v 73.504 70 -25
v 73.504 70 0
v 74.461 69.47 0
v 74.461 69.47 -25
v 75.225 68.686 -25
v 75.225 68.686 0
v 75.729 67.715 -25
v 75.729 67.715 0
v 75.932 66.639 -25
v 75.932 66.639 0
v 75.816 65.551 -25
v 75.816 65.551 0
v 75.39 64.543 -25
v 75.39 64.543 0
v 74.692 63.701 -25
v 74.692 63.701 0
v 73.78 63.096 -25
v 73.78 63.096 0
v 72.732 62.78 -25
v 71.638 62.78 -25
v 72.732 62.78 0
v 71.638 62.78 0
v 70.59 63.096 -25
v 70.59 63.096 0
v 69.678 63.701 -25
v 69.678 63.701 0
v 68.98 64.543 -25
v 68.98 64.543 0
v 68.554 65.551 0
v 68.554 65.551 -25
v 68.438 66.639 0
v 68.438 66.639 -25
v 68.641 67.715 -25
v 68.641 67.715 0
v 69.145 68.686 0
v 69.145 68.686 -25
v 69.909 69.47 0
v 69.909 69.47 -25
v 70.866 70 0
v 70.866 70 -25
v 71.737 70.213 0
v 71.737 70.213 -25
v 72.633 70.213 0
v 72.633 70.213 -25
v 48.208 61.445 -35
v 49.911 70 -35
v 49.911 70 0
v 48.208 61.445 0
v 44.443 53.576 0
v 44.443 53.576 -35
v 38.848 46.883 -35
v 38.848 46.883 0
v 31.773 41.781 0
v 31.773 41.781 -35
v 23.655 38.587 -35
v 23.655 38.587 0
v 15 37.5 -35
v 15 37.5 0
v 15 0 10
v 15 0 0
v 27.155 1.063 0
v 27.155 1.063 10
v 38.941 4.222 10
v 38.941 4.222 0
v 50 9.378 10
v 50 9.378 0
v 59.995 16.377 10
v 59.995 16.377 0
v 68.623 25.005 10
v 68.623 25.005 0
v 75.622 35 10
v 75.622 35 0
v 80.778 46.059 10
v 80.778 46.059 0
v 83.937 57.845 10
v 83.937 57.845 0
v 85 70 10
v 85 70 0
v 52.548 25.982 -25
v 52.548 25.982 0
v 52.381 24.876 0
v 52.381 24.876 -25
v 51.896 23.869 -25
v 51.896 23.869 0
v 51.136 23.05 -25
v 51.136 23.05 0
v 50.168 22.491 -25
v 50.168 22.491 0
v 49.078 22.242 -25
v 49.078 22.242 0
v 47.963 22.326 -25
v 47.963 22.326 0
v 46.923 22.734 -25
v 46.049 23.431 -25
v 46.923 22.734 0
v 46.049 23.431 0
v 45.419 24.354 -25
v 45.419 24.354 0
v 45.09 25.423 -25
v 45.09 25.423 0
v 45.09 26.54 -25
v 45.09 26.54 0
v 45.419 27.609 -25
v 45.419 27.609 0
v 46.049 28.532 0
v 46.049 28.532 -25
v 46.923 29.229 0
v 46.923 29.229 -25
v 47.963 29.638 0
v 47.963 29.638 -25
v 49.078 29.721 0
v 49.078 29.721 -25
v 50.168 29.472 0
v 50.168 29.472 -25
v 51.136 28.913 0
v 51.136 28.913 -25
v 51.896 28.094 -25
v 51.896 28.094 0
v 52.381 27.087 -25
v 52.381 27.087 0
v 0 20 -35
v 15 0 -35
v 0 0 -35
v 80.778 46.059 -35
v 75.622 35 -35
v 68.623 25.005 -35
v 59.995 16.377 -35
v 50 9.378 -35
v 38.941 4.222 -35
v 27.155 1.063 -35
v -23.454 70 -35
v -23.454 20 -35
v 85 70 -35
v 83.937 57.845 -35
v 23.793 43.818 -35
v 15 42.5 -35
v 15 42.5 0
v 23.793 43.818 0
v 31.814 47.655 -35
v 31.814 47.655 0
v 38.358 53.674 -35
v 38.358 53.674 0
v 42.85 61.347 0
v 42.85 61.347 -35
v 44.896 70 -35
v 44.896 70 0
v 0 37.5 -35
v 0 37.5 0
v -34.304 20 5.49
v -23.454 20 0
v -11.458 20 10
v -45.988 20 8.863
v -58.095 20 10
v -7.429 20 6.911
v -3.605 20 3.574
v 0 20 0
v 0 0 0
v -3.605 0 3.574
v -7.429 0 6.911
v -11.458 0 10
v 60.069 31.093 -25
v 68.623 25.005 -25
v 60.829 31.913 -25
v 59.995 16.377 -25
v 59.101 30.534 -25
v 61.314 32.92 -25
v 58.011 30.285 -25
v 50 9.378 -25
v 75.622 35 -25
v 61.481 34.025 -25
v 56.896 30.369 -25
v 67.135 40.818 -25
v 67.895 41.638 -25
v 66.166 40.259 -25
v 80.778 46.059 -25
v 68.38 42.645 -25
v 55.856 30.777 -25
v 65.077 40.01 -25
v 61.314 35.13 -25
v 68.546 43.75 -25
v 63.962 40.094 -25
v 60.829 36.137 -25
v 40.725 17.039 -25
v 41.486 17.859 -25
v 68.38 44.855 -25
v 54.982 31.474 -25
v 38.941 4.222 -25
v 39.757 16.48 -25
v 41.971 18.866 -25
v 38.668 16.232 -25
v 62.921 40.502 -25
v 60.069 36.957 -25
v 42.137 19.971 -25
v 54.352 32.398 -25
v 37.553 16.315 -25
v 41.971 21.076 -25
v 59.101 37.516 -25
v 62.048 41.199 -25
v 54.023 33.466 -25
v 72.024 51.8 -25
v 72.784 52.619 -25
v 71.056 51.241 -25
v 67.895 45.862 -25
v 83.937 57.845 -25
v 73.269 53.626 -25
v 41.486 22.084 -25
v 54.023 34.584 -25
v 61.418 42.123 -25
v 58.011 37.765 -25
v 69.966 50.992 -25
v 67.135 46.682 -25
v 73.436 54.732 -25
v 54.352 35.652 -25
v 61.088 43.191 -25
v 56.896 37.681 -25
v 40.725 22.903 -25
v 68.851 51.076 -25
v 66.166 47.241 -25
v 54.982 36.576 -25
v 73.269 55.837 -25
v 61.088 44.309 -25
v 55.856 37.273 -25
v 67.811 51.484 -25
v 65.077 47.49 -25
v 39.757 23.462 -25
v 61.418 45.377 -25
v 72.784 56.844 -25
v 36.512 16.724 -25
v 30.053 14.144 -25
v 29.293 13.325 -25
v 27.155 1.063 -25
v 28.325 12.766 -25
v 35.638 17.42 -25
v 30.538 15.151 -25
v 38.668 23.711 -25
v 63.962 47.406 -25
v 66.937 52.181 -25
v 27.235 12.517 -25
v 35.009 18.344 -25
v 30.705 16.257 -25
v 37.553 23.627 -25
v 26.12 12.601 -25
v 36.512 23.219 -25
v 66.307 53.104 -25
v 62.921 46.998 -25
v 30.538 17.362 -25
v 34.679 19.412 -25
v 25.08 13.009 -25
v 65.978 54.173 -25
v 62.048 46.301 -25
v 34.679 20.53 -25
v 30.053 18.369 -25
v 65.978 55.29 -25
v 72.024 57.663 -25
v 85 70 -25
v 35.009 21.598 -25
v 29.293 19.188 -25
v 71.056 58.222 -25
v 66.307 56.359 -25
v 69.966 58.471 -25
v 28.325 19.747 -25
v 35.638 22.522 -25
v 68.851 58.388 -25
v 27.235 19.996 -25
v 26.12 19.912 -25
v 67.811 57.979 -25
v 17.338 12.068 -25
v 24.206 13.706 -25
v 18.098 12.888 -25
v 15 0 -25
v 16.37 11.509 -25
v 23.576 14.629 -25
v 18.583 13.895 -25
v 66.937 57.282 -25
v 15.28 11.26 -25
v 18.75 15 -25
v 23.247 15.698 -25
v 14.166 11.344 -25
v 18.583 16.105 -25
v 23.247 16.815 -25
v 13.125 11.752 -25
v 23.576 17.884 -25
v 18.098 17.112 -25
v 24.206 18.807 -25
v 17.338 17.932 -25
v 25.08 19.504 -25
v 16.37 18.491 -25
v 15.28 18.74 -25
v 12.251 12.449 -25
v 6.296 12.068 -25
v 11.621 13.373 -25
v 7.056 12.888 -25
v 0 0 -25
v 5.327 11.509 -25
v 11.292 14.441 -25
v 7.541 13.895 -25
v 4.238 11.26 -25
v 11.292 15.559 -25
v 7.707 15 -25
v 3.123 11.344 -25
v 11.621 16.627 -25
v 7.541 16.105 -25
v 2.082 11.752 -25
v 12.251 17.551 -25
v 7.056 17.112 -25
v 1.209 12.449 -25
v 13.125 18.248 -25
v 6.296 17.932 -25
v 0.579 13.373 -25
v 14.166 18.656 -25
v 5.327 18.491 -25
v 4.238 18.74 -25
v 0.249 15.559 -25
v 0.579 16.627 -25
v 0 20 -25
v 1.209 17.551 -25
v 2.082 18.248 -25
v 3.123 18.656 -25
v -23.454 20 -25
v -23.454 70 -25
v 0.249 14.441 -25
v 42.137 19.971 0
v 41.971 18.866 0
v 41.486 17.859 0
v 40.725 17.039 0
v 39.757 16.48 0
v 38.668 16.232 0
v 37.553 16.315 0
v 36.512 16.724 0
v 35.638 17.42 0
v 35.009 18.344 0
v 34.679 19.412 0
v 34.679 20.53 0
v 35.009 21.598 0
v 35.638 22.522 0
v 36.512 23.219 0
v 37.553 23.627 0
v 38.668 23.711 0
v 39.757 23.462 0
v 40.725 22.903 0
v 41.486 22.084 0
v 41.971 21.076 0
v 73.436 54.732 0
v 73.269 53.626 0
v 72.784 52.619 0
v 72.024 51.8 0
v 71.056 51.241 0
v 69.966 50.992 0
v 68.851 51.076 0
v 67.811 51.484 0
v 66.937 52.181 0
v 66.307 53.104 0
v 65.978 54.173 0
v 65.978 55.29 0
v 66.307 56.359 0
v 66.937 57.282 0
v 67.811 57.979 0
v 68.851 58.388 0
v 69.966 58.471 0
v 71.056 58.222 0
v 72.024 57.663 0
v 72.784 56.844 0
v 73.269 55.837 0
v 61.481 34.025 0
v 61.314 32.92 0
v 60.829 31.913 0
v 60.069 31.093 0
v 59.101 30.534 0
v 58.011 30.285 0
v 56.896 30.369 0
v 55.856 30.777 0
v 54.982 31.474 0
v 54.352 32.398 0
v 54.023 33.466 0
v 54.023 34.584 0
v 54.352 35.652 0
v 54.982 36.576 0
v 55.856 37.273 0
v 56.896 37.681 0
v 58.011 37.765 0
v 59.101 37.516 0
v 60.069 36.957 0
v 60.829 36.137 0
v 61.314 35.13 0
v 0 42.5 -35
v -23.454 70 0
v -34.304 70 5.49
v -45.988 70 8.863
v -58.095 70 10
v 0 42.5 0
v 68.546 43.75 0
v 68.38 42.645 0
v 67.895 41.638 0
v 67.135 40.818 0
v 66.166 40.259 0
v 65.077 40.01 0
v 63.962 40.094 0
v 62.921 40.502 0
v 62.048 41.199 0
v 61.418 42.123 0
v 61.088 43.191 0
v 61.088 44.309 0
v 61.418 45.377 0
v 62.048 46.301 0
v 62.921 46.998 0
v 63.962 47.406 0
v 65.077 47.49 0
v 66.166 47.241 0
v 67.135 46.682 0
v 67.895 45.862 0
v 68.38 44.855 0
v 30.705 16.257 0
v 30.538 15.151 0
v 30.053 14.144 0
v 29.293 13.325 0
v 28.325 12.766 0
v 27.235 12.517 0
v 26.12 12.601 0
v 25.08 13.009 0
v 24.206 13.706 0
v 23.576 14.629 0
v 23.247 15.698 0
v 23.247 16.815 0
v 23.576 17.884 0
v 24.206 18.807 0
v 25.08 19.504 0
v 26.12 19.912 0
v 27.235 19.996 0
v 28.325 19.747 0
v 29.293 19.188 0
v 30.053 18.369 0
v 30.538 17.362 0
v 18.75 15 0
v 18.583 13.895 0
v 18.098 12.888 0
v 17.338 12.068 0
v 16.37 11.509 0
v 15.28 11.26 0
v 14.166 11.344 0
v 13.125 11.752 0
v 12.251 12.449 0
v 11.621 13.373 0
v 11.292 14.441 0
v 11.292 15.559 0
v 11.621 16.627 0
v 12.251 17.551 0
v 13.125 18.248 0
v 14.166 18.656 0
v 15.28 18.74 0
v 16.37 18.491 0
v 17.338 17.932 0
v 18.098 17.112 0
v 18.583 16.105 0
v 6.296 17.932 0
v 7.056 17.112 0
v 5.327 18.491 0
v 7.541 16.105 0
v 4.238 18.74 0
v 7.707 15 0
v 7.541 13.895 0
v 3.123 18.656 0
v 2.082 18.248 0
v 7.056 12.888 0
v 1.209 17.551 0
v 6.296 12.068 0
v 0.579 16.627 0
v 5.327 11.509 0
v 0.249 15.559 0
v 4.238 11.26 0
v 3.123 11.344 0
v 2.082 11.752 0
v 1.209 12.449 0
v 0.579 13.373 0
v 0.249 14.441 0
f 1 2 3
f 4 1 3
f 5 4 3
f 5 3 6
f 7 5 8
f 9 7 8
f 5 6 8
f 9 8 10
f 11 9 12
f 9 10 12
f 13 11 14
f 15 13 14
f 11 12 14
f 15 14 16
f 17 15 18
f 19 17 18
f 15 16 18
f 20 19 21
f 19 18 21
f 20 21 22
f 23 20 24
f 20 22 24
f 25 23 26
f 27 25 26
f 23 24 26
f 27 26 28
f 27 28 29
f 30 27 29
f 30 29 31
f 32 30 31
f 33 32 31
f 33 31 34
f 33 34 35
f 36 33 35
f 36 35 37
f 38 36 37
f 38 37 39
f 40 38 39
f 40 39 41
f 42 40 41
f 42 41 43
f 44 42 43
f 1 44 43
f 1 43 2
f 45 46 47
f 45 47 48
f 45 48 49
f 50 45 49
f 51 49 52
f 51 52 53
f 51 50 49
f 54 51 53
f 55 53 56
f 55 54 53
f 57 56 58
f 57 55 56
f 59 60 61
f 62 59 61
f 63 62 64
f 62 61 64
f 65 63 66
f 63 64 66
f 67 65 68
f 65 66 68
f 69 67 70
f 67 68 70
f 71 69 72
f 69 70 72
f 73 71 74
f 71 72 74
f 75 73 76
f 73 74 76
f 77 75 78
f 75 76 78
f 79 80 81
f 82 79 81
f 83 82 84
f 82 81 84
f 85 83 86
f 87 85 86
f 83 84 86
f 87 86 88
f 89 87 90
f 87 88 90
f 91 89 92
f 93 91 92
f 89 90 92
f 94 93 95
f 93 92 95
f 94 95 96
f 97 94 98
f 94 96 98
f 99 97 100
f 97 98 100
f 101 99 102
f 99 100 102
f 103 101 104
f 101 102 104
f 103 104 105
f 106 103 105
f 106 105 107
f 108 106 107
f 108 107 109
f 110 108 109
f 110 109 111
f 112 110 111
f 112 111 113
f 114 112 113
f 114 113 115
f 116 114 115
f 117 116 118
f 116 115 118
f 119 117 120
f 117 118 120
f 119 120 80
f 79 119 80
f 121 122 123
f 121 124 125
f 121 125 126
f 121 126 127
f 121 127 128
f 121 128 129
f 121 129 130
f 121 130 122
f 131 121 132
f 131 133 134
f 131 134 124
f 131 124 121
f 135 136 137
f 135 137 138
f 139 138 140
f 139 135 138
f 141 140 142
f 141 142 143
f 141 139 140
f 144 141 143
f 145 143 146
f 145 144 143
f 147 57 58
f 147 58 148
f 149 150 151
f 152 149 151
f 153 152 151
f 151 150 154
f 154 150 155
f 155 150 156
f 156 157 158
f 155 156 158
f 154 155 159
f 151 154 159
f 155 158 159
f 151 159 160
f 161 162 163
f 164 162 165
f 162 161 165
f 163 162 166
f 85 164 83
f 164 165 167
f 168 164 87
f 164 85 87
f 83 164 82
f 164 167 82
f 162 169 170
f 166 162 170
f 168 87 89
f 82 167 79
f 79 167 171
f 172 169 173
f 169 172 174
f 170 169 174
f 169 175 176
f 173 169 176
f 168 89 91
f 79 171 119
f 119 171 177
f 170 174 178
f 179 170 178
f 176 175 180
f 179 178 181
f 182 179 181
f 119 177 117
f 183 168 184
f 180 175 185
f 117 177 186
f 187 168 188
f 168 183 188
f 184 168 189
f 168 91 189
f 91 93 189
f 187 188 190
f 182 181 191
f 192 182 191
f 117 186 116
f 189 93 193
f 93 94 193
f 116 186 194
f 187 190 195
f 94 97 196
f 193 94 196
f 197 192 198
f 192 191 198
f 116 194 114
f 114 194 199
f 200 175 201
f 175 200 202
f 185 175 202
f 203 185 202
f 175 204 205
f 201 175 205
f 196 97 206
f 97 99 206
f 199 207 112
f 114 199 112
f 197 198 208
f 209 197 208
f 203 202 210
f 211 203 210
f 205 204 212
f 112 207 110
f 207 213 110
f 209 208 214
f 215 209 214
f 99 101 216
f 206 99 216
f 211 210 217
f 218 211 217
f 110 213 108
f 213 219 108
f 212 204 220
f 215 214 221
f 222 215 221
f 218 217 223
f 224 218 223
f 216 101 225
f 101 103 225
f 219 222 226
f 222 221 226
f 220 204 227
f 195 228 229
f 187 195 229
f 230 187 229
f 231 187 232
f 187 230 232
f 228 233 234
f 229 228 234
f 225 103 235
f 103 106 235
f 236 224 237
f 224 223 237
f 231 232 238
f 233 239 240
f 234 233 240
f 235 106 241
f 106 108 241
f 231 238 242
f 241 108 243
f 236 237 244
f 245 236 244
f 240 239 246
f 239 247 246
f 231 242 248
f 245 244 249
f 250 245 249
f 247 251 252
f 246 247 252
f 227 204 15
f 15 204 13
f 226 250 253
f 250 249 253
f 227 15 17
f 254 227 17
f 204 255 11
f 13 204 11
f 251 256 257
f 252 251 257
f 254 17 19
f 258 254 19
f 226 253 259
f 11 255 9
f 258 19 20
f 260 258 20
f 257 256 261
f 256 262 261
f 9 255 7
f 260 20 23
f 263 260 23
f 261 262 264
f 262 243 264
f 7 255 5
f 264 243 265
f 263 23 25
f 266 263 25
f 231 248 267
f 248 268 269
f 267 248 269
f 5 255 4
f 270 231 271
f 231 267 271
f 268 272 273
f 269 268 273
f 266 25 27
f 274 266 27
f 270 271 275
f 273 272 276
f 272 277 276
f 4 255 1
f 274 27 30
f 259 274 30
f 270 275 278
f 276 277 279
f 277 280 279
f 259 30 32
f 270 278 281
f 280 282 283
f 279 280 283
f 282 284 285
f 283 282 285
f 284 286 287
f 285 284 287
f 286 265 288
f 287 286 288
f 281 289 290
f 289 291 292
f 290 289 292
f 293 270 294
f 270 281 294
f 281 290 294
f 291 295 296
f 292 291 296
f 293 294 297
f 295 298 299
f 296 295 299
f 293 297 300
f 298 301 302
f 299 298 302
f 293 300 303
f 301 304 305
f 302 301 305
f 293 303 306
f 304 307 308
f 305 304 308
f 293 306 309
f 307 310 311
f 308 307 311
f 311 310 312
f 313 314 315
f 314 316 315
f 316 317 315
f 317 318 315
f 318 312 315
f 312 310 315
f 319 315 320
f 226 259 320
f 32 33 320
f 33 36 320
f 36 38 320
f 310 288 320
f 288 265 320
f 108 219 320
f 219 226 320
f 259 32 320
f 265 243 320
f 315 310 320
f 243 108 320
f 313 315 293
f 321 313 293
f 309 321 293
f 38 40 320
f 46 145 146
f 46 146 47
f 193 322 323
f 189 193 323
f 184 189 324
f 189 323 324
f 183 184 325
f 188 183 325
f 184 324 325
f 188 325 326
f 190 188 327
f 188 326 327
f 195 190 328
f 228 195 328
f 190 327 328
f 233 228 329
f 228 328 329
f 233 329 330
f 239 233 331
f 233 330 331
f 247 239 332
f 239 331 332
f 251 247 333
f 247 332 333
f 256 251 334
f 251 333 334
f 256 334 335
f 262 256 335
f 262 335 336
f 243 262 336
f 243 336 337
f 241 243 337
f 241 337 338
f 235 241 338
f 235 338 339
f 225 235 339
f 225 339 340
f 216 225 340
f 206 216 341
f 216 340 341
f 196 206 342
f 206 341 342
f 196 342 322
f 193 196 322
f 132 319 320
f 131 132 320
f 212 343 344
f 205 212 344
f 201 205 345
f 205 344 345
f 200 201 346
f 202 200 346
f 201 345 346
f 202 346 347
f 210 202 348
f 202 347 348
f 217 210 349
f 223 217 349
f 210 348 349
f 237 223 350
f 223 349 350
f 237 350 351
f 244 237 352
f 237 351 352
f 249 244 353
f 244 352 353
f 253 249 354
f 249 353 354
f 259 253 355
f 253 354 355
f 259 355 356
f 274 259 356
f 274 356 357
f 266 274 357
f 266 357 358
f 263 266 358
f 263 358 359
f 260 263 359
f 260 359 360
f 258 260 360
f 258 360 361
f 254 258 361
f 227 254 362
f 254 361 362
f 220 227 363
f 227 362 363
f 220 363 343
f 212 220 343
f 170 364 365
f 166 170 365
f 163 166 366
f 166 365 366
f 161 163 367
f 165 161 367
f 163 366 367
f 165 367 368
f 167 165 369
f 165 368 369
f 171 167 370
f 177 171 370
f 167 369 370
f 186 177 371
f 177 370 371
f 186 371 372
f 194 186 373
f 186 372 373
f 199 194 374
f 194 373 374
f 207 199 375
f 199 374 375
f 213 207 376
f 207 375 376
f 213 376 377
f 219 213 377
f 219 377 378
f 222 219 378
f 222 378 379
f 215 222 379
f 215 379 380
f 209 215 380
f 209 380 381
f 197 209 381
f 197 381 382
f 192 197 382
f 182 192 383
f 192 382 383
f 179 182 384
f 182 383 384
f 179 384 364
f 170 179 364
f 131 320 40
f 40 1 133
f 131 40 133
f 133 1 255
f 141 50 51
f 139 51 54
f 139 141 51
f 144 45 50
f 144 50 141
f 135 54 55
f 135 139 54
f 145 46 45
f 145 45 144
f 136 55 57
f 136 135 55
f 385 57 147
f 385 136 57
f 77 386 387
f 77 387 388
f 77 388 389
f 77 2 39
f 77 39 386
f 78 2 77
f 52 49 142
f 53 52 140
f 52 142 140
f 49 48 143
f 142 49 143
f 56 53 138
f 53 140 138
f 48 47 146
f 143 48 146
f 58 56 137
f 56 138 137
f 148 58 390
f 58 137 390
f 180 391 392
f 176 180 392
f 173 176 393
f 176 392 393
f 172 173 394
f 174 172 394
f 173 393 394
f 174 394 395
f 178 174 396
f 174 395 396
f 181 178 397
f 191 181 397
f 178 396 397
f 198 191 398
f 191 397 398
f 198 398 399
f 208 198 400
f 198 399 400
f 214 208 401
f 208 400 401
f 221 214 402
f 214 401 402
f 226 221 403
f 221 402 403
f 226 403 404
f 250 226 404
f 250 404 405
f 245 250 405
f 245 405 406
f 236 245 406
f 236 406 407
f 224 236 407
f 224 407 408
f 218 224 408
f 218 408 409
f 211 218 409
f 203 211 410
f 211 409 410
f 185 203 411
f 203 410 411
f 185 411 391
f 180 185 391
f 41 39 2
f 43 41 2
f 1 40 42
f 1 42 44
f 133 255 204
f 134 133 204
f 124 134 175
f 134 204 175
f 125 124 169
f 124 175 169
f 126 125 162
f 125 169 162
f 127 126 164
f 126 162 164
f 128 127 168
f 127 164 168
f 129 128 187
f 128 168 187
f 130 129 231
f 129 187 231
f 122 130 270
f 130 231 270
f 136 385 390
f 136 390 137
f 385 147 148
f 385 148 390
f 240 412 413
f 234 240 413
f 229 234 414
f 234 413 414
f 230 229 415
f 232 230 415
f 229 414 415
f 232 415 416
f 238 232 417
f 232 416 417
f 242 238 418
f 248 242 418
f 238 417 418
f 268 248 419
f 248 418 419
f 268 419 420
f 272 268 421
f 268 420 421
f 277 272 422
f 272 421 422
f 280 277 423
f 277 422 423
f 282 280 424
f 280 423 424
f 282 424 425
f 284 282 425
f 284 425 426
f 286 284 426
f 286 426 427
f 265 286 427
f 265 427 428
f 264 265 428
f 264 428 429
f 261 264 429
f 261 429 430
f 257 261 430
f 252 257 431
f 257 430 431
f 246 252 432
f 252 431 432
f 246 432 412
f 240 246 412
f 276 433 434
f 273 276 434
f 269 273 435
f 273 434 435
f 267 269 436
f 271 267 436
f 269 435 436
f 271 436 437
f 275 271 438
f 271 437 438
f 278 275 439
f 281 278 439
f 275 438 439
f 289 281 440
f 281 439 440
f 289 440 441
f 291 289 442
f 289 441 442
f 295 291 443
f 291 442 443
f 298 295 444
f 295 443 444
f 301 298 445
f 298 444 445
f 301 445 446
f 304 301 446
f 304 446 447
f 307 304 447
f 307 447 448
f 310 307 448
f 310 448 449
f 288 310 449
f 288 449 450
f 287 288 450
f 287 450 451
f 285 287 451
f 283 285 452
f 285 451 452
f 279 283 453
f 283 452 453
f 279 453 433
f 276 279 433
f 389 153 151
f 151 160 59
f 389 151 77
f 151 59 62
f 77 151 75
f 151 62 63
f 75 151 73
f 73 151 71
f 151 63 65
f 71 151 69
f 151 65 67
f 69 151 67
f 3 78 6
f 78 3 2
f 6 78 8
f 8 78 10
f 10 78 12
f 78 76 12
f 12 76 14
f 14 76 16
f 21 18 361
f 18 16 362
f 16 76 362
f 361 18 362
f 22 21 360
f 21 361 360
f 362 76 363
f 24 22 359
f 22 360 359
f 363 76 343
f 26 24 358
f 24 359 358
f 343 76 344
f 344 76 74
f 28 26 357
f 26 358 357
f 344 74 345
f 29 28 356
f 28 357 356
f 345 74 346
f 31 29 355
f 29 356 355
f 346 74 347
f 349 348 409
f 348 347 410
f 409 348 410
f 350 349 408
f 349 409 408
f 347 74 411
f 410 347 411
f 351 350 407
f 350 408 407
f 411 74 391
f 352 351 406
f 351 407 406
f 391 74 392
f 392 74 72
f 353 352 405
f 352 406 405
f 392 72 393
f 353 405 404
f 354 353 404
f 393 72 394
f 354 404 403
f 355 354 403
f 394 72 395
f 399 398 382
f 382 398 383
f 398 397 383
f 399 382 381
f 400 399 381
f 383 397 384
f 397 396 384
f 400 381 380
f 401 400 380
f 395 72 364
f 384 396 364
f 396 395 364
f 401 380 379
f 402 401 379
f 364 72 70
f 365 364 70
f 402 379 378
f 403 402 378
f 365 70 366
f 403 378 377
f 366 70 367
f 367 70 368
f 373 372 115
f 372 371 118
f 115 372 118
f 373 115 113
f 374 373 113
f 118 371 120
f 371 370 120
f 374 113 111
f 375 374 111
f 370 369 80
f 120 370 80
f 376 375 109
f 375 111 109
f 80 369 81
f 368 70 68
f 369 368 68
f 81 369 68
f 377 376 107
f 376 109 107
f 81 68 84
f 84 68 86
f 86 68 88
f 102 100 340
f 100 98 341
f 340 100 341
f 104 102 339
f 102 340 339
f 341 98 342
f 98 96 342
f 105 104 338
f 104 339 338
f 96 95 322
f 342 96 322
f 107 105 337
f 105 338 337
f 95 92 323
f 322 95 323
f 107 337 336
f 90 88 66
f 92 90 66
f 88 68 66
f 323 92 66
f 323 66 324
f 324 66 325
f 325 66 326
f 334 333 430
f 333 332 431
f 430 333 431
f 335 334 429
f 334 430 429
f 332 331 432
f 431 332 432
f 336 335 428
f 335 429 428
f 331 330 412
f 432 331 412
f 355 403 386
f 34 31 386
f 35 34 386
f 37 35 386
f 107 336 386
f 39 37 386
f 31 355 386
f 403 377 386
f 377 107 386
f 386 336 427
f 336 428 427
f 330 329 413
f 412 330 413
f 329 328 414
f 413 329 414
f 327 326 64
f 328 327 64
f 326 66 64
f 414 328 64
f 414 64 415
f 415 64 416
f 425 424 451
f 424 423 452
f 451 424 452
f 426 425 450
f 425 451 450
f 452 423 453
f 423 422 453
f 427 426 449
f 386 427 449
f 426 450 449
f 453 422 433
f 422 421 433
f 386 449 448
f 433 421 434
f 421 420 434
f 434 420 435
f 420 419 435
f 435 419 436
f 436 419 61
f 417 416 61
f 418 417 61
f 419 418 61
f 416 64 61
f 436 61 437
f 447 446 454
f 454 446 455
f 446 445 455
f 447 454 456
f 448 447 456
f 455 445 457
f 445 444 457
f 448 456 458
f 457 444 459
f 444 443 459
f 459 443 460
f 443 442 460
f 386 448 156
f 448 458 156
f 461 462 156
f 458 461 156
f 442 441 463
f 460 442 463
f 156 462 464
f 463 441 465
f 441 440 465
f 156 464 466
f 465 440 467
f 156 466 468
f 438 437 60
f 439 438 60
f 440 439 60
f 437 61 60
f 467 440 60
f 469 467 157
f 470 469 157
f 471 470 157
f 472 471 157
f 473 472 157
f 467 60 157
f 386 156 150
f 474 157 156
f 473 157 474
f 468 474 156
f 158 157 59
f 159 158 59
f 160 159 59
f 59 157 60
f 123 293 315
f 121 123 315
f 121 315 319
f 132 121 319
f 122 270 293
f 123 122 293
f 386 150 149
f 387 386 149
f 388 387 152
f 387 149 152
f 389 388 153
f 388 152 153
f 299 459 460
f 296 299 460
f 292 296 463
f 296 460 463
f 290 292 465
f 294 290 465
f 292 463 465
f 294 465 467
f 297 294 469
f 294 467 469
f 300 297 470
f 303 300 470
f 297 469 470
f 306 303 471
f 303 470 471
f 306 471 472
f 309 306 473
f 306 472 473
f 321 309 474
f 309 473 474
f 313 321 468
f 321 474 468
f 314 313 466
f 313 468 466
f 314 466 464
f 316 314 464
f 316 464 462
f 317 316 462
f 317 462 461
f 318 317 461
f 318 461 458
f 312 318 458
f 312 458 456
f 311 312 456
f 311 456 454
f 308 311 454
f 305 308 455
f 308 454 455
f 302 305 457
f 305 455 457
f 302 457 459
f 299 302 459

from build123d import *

# Parameters (mm, degrees)
EXTRUDE_1_DEPTH = 10
EXTRUDE_3_DEPTH = 20
EXTRUDE_START   = 20
EXTRUDE_4_DEPTH = 50
EXTRUDE_START_2 = 25
EXTRUDE_5_DEPTH = 10
SKETCH_3_R      = 3.75
EXTRUDE_6_DEPTH = 25
EXTRUDE_9_DEPTH = 35


# Read off the part's stored shape, not the designer's step: 凸台-拉伸3, 凸台-拉伸4
with BuildPart() as part:
    # 草图1 → 凸台-拉伸1 (new body)
    with BuildSketch(Plane.XY):
        with BuildLine():
            Line((0, 0), (15, 0))
            ThreePointArc((15, 0), (64.497474683, 20.502525317), (85, 70))
            Line((85, 70), (15, 70))
            Line((15, 70), (0, 70))
            Line((0, 70), (0, 20))
            Line((0, 20), (0, 0))
        make_face()
    extrude(amount=EXTRUDE_1_DEPTH)

    # 凸台-拉伸3 outline → 凸台-拉伸3 (add)
    with BuildSketch(Plane(origin=(0, 0, 0), x_dir=(1, 0, 0), z_dir=(0, 1, 0))):
        with BuildLine():
            ThreePointArc((0, 0), (-5.490763746, -5.272884533), (-11.457854928, -10))
            Line((-11.457854928, -10), (0, -10))
            Line((0, -10), (0, 0))
        make_face()
    extrude(amount=EXTRUDE_3_DEPTH)

    # 凸台-拉伸4 outline → 凸台-拉伸4 (add)
    with BuildSketch(Plane(origin=(0, 0, 0), x_dir=(1, 0, 0), z_dir=(0, 1, 0)).offset(EXTRUDE_START)):
        with BuildLine():
            ThreePointArc((-23.453734042, 0), (-40.066993816, -7.449979984), (-58.094750193, -10))
            Line((-58.094750193, -10), (0, -10))
            Line((0, -10), (0, 0))
            Line((0, 0), (-23.453734042, 0))
        make_face()
    extrude(amount=EXTRUDE_4_DEPTH)



with BuildPart() as body_2:
    # 草图6 → 凸台-拉伸5 (new body)
    with BuildSketch(Plane(origin=(0, 0, 0), x_dir=(-1, 0, 0), z_dir=(0, 0, -1)).offset(EXTRUDE_START_2)):
        with BuildLine():
            Line((-15, 0), (0, 0))
            Line((0, 0), (0, 20))
            Line((0, 20), (23.453734042, 20))
            Line((23.453734042, 20), (23.453734042, 70))
            Line((23.453734042, 70), (-85, 70))
            ThreePointArc((-85, 70), (-64.497474683, 20.502525317), (-15, 0))
        make_face()
    extrude(amount=EXTRUDE_5_DEPTH)


with BuildPart() as part_1:
    add(part.part)

    add(body_2.part)  # 凸台-拉伸6 merges body 2
    # 草图3 → 凸台-拉伸6 (add)
    with BuildSketch(Plane(origin=(0, 0, 0), x_dir=(-1, 0, 0), z_dir=(0, 0, -1))):
        with Locations(Location((-15, 15, 0), (0, 0, 180))):
            Circle(SKETCH_3_R)
        with Locations(Location((-26.954922222, 16.256512958, 0), (0, 0, 180))):
            Circle(SKETCH_3_R)
        with Locations(Location((-38.387356977, 19.971136186, 0), (0, 0, 180))):
            Circle(SKETCH_3_R)
        with Locations(Location((-48.797652007, 25.981522823, 0), (0, 0, 180))):
            Circle(SKETCH_3_R)
        with Locations(Location((-57.730827465, 34.024990134, 0), (0, 0, 180))):
            Circle(SKETCH_3_R)
        with Locations(Location((-64.796460718, 43.75, 0), (0, 0, 180))):
            Circle(SKETCH_3_R)
        with Locations(Location((-69.685749687, 54.731522823, 0), (0, 0, 180))):
            Circle(SKETCH_3_R)
        with Locations(Location((-72.185008984, 66.489613362, 0), (0, 0, 110.592904033))):
            Circle(SKETCH_3_R)
        with Locations(Location((-3.957469551, 15, 0), (0, 0, 180))):
            Circle(SKETCH_3_R)
    extrude(amount=EXTRUDE_6_DEPTH)


with BuildPart() as body_2_2:
    # 草图8 → 凸台-拉伸9 (new body)
    with BuildSketch(Plane(origin=(0, 0, -35), x_dir=(-1, 0, 0), z_dir=(0, 0, -1))):
        with BuildLine():
            Line((-15, 37.5), (0, 37.5))
            Line((0, 37.5), (0, 42.5))
            Line((0, 42.5), (-15, 42.5))
            ThreePointArc((-15, 42.5), (-35.310096012, 50.420597834), (-44.895651858, 70))
            Line((-44.895651858, 70), (-44.919254128, 70))
            Line((-44.919254128, 70), (-49.910600109, 70))
            ThreePointArc((-49.910600109, 70), (-38.848480035, 46.882623085), (-15, 37.5))
        make_face()
    extrude(amount=-EXTRUDE_9_DEPTH)


solid = Compound([part_1.part, body_2_2.part])
